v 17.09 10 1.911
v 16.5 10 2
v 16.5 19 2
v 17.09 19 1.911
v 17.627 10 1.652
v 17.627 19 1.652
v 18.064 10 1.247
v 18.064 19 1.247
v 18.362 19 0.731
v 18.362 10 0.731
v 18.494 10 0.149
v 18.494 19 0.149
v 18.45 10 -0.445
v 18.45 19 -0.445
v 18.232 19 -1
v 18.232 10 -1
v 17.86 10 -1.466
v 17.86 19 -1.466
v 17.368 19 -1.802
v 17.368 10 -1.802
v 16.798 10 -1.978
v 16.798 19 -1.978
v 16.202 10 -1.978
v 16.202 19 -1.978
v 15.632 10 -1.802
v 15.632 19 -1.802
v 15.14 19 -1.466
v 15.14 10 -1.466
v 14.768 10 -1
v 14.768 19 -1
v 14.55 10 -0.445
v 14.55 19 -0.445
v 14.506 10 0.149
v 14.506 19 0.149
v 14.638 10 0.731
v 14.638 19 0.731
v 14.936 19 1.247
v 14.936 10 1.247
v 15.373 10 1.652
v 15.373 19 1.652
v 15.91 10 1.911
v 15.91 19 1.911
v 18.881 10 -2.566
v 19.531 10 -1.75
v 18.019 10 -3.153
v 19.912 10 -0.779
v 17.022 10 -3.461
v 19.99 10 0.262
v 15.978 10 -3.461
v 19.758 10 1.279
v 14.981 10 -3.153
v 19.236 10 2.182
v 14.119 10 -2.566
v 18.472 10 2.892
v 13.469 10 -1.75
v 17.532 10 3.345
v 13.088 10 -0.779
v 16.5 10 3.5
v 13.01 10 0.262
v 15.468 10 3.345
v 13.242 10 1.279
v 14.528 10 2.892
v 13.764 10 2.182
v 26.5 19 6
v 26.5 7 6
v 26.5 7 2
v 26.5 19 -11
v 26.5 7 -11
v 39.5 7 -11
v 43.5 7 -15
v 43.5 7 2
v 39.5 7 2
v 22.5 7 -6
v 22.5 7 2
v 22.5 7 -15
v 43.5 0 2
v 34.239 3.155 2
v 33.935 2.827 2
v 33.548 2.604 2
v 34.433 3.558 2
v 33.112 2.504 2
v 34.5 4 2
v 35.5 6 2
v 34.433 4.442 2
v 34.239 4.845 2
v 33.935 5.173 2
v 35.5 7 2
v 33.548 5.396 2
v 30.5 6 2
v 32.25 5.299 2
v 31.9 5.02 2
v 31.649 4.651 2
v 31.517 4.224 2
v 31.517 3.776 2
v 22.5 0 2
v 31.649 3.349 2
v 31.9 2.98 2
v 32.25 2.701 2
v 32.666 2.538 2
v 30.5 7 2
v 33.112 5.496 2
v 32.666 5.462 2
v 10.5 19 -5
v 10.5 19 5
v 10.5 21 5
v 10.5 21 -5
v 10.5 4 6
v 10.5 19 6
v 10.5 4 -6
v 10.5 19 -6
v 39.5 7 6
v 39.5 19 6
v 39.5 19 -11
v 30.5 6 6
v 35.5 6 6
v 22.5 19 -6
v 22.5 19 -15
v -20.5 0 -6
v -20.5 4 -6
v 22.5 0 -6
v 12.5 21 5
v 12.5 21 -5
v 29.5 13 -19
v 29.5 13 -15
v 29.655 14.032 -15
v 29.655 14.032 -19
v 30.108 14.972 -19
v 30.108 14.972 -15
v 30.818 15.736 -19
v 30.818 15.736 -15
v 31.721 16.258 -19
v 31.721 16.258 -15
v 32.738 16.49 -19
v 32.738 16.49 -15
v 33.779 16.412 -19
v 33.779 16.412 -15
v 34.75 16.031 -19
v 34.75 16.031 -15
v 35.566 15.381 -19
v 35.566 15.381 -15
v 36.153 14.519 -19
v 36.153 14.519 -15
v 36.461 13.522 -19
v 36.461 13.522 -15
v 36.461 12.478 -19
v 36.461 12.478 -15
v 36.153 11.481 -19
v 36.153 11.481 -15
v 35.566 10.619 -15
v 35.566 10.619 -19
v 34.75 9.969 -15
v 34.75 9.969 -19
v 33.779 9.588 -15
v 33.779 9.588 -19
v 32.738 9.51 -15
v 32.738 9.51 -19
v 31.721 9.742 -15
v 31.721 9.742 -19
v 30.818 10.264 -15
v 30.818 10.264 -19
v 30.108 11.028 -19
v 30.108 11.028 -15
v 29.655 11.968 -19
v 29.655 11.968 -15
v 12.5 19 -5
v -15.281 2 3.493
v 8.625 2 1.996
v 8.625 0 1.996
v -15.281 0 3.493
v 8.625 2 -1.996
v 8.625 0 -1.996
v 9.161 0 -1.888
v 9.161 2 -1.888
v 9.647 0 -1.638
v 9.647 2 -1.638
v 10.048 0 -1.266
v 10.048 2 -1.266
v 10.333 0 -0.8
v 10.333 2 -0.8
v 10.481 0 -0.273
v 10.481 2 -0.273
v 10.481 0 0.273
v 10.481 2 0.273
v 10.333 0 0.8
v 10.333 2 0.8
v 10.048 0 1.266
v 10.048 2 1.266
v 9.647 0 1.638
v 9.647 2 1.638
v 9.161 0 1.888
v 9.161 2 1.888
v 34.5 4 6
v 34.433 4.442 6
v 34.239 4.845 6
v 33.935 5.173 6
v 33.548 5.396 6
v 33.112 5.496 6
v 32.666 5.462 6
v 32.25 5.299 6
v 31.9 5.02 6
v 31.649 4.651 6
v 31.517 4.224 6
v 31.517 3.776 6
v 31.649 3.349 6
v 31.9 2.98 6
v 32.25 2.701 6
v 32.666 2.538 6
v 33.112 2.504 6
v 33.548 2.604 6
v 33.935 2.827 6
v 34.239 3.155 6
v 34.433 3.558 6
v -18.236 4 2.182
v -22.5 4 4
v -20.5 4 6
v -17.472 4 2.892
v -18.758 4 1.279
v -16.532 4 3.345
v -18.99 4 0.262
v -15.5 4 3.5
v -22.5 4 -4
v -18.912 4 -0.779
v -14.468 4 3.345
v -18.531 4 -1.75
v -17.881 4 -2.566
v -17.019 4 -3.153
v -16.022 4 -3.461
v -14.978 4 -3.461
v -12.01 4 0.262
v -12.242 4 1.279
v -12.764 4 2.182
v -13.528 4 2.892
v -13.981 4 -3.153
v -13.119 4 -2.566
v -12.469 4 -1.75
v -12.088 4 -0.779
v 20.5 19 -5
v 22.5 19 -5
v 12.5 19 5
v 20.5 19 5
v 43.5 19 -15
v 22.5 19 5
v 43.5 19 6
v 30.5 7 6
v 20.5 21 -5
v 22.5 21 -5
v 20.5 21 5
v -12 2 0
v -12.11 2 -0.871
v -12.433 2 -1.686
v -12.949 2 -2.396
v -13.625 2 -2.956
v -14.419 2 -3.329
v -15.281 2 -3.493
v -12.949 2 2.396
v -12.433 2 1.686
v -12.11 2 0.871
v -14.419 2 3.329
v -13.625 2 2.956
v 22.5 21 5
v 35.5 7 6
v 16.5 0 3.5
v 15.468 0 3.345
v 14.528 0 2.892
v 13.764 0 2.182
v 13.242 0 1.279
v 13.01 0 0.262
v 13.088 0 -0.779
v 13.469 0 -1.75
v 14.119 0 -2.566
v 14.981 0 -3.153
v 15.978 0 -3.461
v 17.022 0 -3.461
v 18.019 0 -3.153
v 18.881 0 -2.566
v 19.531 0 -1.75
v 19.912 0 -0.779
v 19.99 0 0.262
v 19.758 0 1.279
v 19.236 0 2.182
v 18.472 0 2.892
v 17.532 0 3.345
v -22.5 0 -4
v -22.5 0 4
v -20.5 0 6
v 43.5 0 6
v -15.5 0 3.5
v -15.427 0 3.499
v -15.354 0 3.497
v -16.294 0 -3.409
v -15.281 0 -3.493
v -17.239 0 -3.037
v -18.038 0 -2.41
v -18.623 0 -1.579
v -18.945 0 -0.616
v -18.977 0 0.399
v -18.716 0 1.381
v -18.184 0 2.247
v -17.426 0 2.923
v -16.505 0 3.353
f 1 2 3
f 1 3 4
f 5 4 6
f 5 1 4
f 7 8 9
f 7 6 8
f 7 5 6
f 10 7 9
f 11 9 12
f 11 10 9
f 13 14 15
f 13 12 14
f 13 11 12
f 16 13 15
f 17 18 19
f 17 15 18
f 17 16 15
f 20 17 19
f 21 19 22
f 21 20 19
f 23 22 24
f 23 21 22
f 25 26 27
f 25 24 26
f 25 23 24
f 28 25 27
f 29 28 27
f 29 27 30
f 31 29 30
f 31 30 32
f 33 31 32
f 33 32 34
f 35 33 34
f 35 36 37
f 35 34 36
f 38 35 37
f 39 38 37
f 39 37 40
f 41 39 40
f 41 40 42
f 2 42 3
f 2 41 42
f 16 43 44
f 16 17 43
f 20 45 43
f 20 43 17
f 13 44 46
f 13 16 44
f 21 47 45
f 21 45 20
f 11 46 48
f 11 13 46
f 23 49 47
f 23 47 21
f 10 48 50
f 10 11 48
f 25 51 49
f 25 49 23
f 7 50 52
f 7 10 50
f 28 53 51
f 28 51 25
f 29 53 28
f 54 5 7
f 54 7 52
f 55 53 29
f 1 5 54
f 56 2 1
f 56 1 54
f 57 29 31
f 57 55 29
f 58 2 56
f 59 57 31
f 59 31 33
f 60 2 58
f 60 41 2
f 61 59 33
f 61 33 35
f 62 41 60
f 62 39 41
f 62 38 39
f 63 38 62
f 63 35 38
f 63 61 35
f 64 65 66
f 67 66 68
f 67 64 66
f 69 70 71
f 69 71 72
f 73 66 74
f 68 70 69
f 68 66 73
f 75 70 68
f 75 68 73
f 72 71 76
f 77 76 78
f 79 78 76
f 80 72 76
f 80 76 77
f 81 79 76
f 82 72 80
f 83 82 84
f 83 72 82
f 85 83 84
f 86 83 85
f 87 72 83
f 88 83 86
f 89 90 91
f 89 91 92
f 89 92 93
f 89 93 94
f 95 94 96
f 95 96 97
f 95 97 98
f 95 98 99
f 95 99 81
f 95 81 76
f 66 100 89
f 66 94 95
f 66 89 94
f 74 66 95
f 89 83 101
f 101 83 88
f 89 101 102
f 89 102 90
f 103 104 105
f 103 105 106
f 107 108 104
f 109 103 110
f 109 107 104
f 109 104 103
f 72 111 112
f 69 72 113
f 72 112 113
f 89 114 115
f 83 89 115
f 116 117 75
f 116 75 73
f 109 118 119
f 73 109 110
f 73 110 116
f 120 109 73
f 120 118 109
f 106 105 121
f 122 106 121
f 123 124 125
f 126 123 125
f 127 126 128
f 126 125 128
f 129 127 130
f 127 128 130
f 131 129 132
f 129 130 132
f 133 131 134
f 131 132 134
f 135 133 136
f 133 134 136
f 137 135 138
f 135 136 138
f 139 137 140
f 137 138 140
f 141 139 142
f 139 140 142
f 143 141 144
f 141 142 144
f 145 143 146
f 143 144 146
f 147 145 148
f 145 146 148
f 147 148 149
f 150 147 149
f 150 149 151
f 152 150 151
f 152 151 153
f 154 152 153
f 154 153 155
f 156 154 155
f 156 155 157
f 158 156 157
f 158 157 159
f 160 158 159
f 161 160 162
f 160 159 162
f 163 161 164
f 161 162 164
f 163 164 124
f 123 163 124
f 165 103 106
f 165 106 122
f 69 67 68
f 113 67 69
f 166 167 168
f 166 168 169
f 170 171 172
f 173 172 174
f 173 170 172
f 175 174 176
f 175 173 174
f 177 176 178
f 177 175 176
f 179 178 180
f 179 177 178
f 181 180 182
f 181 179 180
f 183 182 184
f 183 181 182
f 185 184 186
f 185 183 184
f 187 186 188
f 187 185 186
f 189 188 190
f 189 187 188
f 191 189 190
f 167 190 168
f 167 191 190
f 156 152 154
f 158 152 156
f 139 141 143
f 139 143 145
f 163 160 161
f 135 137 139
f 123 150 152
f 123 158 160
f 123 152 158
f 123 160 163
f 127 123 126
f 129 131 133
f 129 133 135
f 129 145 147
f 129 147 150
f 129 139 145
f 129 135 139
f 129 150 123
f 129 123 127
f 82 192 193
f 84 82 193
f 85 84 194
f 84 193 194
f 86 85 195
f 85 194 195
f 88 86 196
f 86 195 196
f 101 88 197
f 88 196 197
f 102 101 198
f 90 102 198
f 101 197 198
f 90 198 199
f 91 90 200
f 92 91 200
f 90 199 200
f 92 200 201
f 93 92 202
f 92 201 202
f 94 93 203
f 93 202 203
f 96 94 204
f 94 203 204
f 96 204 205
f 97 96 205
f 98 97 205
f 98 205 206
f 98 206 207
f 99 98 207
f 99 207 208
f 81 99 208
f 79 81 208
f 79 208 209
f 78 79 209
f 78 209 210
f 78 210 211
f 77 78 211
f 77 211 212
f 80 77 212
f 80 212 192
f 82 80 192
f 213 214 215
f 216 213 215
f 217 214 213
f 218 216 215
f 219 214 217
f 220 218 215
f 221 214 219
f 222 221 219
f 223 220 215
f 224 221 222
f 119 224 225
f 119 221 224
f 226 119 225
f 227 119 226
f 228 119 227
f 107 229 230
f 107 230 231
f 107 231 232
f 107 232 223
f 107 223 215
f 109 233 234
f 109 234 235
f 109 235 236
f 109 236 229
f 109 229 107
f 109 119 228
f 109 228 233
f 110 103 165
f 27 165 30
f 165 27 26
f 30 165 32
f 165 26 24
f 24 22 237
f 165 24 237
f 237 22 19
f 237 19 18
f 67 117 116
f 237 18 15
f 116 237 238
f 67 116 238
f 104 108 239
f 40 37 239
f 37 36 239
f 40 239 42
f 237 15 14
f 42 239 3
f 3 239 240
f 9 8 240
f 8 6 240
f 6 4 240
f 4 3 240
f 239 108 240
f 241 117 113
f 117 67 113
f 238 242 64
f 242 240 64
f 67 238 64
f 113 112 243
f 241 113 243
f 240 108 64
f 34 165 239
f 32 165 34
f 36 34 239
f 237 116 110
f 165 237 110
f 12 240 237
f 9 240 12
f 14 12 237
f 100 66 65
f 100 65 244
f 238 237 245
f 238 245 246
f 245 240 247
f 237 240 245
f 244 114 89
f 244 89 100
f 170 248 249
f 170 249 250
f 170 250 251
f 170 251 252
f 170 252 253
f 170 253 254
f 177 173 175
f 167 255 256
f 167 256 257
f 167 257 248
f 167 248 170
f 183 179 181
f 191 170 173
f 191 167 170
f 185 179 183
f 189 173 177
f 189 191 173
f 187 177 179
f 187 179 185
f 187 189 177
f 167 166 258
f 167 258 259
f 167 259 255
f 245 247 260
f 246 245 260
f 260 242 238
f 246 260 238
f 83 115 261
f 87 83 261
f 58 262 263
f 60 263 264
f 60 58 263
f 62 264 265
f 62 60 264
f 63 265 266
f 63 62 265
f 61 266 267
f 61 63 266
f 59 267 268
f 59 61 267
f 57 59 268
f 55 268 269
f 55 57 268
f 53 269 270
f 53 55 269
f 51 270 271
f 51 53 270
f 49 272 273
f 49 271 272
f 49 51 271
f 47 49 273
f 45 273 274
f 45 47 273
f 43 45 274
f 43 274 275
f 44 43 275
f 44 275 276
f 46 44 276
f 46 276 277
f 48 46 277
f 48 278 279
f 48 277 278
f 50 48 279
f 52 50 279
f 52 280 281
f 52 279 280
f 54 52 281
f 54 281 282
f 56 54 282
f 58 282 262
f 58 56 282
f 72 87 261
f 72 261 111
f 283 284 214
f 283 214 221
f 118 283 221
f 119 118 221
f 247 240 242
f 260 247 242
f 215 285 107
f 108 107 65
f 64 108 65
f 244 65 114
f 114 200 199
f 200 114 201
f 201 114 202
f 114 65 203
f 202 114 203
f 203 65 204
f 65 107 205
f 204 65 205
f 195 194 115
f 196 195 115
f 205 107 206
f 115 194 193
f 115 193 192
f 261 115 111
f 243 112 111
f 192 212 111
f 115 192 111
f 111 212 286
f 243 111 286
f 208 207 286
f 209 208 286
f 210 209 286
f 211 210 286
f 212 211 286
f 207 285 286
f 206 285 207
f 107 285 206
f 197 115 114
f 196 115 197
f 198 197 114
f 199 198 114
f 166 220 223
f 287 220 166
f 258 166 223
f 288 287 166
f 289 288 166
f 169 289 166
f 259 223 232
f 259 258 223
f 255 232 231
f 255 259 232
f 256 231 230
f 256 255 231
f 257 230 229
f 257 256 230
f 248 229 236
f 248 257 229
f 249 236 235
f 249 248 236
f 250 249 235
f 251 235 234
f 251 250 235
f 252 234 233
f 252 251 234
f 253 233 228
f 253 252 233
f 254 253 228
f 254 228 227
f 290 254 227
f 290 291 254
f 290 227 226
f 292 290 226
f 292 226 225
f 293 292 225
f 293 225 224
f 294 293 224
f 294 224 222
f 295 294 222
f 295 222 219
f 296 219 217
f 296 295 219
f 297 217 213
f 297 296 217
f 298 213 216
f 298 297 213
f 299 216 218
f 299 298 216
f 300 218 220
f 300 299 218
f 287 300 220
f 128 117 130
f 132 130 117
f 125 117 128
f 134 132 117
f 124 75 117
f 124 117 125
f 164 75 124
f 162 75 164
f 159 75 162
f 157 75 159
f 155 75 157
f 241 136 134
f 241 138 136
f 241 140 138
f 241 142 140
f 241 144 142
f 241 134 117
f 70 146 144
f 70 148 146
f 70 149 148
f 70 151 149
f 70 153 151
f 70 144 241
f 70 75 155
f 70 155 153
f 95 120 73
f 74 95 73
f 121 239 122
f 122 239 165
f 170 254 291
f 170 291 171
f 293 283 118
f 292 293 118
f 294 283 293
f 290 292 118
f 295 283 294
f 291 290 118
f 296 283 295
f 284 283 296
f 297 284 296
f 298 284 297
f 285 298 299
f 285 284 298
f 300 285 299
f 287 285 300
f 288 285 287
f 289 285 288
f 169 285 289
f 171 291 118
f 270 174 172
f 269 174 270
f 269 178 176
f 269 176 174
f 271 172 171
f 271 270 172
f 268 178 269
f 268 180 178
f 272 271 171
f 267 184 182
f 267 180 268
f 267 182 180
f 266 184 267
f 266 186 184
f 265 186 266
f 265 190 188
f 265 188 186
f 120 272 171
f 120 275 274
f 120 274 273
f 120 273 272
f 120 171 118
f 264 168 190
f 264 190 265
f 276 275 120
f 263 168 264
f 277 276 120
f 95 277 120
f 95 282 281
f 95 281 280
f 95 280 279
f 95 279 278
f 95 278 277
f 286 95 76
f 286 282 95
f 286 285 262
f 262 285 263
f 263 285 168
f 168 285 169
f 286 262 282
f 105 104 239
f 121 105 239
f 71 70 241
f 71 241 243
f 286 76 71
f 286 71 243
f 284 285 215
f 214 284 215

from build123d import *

# Parameters (mm, degrees)
SKETCH_1_W               = 45
SKETCH_1_H               = 12
EXTRUDE_1_DEPTH          = 4
SKETCH_2_W               = 12
SKETCH_2_H               = 12
EXTRUDE_2_DEPTH          = 15
SKETCH_3_W               = 2
SKETCH_3_H               = 10
EXTRUDE_3_DEPTH          = 2
SKETCH_4_W               = 21
SKETCH_4_H               = 21
EXTRUDE_4_DEPTH          = 19
SKETCH_5_W               = 13
SKETCH_5_H               = 13
CUT_EXTRUDE_1_DEPTH      = 50.782024868
SKETCH_6_W               = 13
SKETCH_6_H               = 4
CUT_EXTRUDE_2_DEPTH      = 12
CUT_EXTRUDE_3_REACH      = 54.671
SKETCH_7_W               = 5
SKETCH_7_H               = 2
CUT_EXTRUDE_4_REACH      = 54.671
SKETCH_8_R               = 1.5
CHAMFER_1_SIZE           = 2
CUT_EXTRUDE_5_DEPTH      = 50.053542176
CUT_EXTRUDE_5_DEPTH_BACK = 50.053542176
SKETCH_9_R               = 3.5
CUT_EXTRUDE_6_DEPTH      = 51.5791459
CUT_EXTRUDE_6_DEPTH_BACK = 2
SKETCH_10_R              = 2
CUT_EXTRUDE_7_DEPTH      = 50.782024868
CUT_EXTRUDE_7_DEPTH_BACK = 50.782024868
SKETCH_11_R              = 2
CUT_EXTRUDE_8_DEPTH      = 51.5791459
CUT_EXTRUDE_8_DEPTH_BACK = 10
SKETCH_12_R              = 3.5
SKETCH_13_W              = 21
SKETCH_13_H              = 7
CUT_EXTRUDE_9_DEPTH      = 17
SKETCH_14_R              = 3.5
EXTRUDE_5_DEPTH          = 4


with BuildPart() as part:
    # 草图1 → 凸台-拉伸1 (new body)
    with BuildSketch(Plane(origin=(0, 0, 0), x_dir=(1, 0, 0), z_dir=(0, 1, 0))):
        Rectangle(SKETCH_1_W, SKETCH_1_H)
    extrude(amount=EXTRUDE_1_DEPTH)

    # 草图2 → 凸台-拉伸2 (add)
    with BuildSketch(Plane(origin=(0, 4, 0), x_dir=(1, 0, 0), z_dir=(0, 1, 0))):
        with Locations((16.5, 0)):
            Rectangle(SKETCH_2_W, SKETCH_2_H)
    extrude(amount=EXTRUDE_2_DEPTH)

    # 草图3 → 凸台-拉伸3 (add)
    with BuildSketch(Plane(origin=(0, 19, 0), x_dir=(1, 0, 0), z_dir=(0, 1, 0))):
        with Locations((11.5, 0)):
            Rectangle(SKETCH_3_W, SKETCH_3_H)
        with Locations((21.5, 0)):
            Rectangle(SKETCH_3_W, SKETCH_3_H)
    extrude(amount=EXTRUDE_3_DEPTH)

    # 草图4 → 凸台-拉伸4 (add)
    with BuildSketch(Plane.XZ):
        with Locations((33, -4.5)):
            Rectangle(SKETCH_4_W, SKETCH_4_H)
    extrude(amount=-EXTRUDE_4_DEPTH)

    # 草图5 → 切除-拉伸1 (cut, through all)
    with BuildSketch(Plane(origin=(0, 19, 0), x_dir=(1, 0, 0), z_dir=(0, 1, 0))):
        with Locations((33, 4.5)):
            Rectangle(SKETCH_5_W, SKETCH_5_H)
    extrude(amount=-CUT_EXTRUDE_1_DEPTH, mode=Mode.SUBTRACT)

    # 草图6 → 切除-拉伸2 (cut)
    with BuildSketch(Plane(origin=(0, 19, 0), x_dir=(1, 0, 0), z_dir=(0, 1, 0))):
        with Locations((33, -4)):
            Rectangle(SKETCH_6_W, SKETCH_6_H)
    extrude(amount=-CUT_EXTRUDE_2_DEPTH, mode=Mode.SUBTRACT)

    # 草图7 → 切除-拉伸3 (cut, up to next)
    with BuildSketch(Plane.XY.offset(6), mode=Mode.PRIVATE) as cut_extrude_3_sk1:
        with Locations((33, 7)):
            Rectangle(SKETCH_7_W, SKETCH_7_H)
    cut_extrude_3_tool1 = extrude(cut_extrude_3_sk1.sketch, amount=-CUT_EXTRUDE_3_REACH, mode=Mode.PRIVATE) & part.part
    add(cut_extrude_3_tool1.solids().sort_by_distance((33, 7, 6))[0], mode=Mode.SUBTRACT)

    # 草图8 → 切除-拉伸4 (cut, up to next)
    with BuildSketch(Plane.XY.offset(6), mode=Mode.PRIVATE) as cut_extrude_4_sk1:
        with Locations((33, 4)):
            Circle(SKETCH_8_R)
    cut_extrude_4_tool1 = extrude(cut_extrude_4_sk1.sketch, amount=-CUT_EXTRUDE_4_REACH, mode=Mode.PRIVATE) & part.part
    add(cut_extrude_4_tool1.solids().sort_by_distance((33, 4, 6))[0], mode=Mode.SUBTRACT)

    # 倒角1
    chamfer_1_edges = [part.edges().sort_by_distance(p)[0] for p in [
        (-22.5, 2, -6),
        (-22.5, 2, 6),
    ]]
    chamfer(chamfer_1_edges, length=CHAMFER_1_SIZE)

    # 草图9 → 切除-拉伸5 (cut, two sides: drawn at the far end of the back side and taken through both)
    with BuildSketch(Plane(origin=(0, 4, 0), x_dir=(1, 0, 0), z_dir=(0, 1, 0)).offset(-CUT_EXTRUDE_5_DEPTH_BACK)):
        with Locations(Location((-15.5, 0, 0), (0, 0, 270))):
            Circle(SKETCH_9_R)
    extrude(amount=CUT_EXTRUDE_5_DEPTH + CUT_EXTRUDE_5_DEPTH_BACK, mode=Mode.SUBTRACT)

    # 草图10 → 切除-拉伸6 (cut, two sides: drawn at the far end of the back side and taken through both)
    with BuildSketch(Plane.XZ.offset(-CUT_EXTRUDE_6_DEPTH_BACK)):
        with BuildLine():
            Line((8.625, 1.996089928), (-15.28125, 3.493157374))
            ThreePointArc((-15.28125, 3.493157374), (-12.948958546, 2.396286189), (-12, 0))
            ThreePointArc((-12, 0), (-12.948958546, -2.396286189), (-15.28125, -3.493157374))
            Line((-15.28125, -3.493157374), (8.625, -1.996089928))
            ThreePointArc((8.625, -1.996089928), (6.5, 0), (8.625, 1.996089928))
        make_face()
        with Locations((8.5, 0)):
            Circle(SKETCH_10_R)
    extrude(amount=CUT_EXTRUDE_6_DEPTH + CUT_EXTRUDE_6_DEPTH_BACK, mode=Mode.SUBTRACT)

    # 草图11 → 切除-拉伸7 (cut, two sides: drawn at the far end of the back side and taken through both)
    with BuildSketch(Plane(origin=(0, 19, 0), x_dir=(1, 0, 0), z_dir=(0, 1, 0)).offset(-CUT_EXTRUDE_7_DEPTH_BACK)):
        with Locations(Location((16.5, 0, 0), (0, 0, 270))):
            Circle(SKETCH_11_R)
    extrude(amount=CUT_EXTRUDE_7_DEPTH + CUT_EXTRUDE_7_DEPTH_BACK, mode=Mode.SUBTRACT)

    # 草图12 → 切除-拉伸8 (cut, two sides: drawn at the far end of the back side and taken through both)
    with BuildSketch(Plane.XZ.offset(-CUT_EXTRUDE_8_DEPTH_BACK)):
        with Locations(Location((16.5, 0, 0), (0, 0, 90))):
            Circle(SKETCH_12_R)
    extrude(amount=CUT_EXTRUDE_8_DEPTH + CUT_EXTRUDE_8_DEPTH_BACK, mode=Mode.SUBTRACT)

    # 草图13 → 切除-拉伸9 (cut)
    with BuildSketch(Plane(origin=(0, 0, -15), x_dir=(-1, 0, 0), z_dir=(0, 0, -1))):
        with Locations((-33, 3.5)):
            Rectangle(SKETCH_13_W, SKETCH_13_H)
    extrude(amount=-CUT_EXTRUDE_9_DEPTH, mode=Mode.SUBTRACT)

    # 草图14 → 凸台-拉伸5 (add)
    with BuildSketch(Plane(origin=(0, 0, -15), x_dir=(-1, 0, 0), z_dir=(0, 0, -1))):
        with Locations((-33, 13)):
            Circle(SKETCH_14_R)
    extrude(amount=EXTRUDE_5_DEPTH)


solid = part.part
